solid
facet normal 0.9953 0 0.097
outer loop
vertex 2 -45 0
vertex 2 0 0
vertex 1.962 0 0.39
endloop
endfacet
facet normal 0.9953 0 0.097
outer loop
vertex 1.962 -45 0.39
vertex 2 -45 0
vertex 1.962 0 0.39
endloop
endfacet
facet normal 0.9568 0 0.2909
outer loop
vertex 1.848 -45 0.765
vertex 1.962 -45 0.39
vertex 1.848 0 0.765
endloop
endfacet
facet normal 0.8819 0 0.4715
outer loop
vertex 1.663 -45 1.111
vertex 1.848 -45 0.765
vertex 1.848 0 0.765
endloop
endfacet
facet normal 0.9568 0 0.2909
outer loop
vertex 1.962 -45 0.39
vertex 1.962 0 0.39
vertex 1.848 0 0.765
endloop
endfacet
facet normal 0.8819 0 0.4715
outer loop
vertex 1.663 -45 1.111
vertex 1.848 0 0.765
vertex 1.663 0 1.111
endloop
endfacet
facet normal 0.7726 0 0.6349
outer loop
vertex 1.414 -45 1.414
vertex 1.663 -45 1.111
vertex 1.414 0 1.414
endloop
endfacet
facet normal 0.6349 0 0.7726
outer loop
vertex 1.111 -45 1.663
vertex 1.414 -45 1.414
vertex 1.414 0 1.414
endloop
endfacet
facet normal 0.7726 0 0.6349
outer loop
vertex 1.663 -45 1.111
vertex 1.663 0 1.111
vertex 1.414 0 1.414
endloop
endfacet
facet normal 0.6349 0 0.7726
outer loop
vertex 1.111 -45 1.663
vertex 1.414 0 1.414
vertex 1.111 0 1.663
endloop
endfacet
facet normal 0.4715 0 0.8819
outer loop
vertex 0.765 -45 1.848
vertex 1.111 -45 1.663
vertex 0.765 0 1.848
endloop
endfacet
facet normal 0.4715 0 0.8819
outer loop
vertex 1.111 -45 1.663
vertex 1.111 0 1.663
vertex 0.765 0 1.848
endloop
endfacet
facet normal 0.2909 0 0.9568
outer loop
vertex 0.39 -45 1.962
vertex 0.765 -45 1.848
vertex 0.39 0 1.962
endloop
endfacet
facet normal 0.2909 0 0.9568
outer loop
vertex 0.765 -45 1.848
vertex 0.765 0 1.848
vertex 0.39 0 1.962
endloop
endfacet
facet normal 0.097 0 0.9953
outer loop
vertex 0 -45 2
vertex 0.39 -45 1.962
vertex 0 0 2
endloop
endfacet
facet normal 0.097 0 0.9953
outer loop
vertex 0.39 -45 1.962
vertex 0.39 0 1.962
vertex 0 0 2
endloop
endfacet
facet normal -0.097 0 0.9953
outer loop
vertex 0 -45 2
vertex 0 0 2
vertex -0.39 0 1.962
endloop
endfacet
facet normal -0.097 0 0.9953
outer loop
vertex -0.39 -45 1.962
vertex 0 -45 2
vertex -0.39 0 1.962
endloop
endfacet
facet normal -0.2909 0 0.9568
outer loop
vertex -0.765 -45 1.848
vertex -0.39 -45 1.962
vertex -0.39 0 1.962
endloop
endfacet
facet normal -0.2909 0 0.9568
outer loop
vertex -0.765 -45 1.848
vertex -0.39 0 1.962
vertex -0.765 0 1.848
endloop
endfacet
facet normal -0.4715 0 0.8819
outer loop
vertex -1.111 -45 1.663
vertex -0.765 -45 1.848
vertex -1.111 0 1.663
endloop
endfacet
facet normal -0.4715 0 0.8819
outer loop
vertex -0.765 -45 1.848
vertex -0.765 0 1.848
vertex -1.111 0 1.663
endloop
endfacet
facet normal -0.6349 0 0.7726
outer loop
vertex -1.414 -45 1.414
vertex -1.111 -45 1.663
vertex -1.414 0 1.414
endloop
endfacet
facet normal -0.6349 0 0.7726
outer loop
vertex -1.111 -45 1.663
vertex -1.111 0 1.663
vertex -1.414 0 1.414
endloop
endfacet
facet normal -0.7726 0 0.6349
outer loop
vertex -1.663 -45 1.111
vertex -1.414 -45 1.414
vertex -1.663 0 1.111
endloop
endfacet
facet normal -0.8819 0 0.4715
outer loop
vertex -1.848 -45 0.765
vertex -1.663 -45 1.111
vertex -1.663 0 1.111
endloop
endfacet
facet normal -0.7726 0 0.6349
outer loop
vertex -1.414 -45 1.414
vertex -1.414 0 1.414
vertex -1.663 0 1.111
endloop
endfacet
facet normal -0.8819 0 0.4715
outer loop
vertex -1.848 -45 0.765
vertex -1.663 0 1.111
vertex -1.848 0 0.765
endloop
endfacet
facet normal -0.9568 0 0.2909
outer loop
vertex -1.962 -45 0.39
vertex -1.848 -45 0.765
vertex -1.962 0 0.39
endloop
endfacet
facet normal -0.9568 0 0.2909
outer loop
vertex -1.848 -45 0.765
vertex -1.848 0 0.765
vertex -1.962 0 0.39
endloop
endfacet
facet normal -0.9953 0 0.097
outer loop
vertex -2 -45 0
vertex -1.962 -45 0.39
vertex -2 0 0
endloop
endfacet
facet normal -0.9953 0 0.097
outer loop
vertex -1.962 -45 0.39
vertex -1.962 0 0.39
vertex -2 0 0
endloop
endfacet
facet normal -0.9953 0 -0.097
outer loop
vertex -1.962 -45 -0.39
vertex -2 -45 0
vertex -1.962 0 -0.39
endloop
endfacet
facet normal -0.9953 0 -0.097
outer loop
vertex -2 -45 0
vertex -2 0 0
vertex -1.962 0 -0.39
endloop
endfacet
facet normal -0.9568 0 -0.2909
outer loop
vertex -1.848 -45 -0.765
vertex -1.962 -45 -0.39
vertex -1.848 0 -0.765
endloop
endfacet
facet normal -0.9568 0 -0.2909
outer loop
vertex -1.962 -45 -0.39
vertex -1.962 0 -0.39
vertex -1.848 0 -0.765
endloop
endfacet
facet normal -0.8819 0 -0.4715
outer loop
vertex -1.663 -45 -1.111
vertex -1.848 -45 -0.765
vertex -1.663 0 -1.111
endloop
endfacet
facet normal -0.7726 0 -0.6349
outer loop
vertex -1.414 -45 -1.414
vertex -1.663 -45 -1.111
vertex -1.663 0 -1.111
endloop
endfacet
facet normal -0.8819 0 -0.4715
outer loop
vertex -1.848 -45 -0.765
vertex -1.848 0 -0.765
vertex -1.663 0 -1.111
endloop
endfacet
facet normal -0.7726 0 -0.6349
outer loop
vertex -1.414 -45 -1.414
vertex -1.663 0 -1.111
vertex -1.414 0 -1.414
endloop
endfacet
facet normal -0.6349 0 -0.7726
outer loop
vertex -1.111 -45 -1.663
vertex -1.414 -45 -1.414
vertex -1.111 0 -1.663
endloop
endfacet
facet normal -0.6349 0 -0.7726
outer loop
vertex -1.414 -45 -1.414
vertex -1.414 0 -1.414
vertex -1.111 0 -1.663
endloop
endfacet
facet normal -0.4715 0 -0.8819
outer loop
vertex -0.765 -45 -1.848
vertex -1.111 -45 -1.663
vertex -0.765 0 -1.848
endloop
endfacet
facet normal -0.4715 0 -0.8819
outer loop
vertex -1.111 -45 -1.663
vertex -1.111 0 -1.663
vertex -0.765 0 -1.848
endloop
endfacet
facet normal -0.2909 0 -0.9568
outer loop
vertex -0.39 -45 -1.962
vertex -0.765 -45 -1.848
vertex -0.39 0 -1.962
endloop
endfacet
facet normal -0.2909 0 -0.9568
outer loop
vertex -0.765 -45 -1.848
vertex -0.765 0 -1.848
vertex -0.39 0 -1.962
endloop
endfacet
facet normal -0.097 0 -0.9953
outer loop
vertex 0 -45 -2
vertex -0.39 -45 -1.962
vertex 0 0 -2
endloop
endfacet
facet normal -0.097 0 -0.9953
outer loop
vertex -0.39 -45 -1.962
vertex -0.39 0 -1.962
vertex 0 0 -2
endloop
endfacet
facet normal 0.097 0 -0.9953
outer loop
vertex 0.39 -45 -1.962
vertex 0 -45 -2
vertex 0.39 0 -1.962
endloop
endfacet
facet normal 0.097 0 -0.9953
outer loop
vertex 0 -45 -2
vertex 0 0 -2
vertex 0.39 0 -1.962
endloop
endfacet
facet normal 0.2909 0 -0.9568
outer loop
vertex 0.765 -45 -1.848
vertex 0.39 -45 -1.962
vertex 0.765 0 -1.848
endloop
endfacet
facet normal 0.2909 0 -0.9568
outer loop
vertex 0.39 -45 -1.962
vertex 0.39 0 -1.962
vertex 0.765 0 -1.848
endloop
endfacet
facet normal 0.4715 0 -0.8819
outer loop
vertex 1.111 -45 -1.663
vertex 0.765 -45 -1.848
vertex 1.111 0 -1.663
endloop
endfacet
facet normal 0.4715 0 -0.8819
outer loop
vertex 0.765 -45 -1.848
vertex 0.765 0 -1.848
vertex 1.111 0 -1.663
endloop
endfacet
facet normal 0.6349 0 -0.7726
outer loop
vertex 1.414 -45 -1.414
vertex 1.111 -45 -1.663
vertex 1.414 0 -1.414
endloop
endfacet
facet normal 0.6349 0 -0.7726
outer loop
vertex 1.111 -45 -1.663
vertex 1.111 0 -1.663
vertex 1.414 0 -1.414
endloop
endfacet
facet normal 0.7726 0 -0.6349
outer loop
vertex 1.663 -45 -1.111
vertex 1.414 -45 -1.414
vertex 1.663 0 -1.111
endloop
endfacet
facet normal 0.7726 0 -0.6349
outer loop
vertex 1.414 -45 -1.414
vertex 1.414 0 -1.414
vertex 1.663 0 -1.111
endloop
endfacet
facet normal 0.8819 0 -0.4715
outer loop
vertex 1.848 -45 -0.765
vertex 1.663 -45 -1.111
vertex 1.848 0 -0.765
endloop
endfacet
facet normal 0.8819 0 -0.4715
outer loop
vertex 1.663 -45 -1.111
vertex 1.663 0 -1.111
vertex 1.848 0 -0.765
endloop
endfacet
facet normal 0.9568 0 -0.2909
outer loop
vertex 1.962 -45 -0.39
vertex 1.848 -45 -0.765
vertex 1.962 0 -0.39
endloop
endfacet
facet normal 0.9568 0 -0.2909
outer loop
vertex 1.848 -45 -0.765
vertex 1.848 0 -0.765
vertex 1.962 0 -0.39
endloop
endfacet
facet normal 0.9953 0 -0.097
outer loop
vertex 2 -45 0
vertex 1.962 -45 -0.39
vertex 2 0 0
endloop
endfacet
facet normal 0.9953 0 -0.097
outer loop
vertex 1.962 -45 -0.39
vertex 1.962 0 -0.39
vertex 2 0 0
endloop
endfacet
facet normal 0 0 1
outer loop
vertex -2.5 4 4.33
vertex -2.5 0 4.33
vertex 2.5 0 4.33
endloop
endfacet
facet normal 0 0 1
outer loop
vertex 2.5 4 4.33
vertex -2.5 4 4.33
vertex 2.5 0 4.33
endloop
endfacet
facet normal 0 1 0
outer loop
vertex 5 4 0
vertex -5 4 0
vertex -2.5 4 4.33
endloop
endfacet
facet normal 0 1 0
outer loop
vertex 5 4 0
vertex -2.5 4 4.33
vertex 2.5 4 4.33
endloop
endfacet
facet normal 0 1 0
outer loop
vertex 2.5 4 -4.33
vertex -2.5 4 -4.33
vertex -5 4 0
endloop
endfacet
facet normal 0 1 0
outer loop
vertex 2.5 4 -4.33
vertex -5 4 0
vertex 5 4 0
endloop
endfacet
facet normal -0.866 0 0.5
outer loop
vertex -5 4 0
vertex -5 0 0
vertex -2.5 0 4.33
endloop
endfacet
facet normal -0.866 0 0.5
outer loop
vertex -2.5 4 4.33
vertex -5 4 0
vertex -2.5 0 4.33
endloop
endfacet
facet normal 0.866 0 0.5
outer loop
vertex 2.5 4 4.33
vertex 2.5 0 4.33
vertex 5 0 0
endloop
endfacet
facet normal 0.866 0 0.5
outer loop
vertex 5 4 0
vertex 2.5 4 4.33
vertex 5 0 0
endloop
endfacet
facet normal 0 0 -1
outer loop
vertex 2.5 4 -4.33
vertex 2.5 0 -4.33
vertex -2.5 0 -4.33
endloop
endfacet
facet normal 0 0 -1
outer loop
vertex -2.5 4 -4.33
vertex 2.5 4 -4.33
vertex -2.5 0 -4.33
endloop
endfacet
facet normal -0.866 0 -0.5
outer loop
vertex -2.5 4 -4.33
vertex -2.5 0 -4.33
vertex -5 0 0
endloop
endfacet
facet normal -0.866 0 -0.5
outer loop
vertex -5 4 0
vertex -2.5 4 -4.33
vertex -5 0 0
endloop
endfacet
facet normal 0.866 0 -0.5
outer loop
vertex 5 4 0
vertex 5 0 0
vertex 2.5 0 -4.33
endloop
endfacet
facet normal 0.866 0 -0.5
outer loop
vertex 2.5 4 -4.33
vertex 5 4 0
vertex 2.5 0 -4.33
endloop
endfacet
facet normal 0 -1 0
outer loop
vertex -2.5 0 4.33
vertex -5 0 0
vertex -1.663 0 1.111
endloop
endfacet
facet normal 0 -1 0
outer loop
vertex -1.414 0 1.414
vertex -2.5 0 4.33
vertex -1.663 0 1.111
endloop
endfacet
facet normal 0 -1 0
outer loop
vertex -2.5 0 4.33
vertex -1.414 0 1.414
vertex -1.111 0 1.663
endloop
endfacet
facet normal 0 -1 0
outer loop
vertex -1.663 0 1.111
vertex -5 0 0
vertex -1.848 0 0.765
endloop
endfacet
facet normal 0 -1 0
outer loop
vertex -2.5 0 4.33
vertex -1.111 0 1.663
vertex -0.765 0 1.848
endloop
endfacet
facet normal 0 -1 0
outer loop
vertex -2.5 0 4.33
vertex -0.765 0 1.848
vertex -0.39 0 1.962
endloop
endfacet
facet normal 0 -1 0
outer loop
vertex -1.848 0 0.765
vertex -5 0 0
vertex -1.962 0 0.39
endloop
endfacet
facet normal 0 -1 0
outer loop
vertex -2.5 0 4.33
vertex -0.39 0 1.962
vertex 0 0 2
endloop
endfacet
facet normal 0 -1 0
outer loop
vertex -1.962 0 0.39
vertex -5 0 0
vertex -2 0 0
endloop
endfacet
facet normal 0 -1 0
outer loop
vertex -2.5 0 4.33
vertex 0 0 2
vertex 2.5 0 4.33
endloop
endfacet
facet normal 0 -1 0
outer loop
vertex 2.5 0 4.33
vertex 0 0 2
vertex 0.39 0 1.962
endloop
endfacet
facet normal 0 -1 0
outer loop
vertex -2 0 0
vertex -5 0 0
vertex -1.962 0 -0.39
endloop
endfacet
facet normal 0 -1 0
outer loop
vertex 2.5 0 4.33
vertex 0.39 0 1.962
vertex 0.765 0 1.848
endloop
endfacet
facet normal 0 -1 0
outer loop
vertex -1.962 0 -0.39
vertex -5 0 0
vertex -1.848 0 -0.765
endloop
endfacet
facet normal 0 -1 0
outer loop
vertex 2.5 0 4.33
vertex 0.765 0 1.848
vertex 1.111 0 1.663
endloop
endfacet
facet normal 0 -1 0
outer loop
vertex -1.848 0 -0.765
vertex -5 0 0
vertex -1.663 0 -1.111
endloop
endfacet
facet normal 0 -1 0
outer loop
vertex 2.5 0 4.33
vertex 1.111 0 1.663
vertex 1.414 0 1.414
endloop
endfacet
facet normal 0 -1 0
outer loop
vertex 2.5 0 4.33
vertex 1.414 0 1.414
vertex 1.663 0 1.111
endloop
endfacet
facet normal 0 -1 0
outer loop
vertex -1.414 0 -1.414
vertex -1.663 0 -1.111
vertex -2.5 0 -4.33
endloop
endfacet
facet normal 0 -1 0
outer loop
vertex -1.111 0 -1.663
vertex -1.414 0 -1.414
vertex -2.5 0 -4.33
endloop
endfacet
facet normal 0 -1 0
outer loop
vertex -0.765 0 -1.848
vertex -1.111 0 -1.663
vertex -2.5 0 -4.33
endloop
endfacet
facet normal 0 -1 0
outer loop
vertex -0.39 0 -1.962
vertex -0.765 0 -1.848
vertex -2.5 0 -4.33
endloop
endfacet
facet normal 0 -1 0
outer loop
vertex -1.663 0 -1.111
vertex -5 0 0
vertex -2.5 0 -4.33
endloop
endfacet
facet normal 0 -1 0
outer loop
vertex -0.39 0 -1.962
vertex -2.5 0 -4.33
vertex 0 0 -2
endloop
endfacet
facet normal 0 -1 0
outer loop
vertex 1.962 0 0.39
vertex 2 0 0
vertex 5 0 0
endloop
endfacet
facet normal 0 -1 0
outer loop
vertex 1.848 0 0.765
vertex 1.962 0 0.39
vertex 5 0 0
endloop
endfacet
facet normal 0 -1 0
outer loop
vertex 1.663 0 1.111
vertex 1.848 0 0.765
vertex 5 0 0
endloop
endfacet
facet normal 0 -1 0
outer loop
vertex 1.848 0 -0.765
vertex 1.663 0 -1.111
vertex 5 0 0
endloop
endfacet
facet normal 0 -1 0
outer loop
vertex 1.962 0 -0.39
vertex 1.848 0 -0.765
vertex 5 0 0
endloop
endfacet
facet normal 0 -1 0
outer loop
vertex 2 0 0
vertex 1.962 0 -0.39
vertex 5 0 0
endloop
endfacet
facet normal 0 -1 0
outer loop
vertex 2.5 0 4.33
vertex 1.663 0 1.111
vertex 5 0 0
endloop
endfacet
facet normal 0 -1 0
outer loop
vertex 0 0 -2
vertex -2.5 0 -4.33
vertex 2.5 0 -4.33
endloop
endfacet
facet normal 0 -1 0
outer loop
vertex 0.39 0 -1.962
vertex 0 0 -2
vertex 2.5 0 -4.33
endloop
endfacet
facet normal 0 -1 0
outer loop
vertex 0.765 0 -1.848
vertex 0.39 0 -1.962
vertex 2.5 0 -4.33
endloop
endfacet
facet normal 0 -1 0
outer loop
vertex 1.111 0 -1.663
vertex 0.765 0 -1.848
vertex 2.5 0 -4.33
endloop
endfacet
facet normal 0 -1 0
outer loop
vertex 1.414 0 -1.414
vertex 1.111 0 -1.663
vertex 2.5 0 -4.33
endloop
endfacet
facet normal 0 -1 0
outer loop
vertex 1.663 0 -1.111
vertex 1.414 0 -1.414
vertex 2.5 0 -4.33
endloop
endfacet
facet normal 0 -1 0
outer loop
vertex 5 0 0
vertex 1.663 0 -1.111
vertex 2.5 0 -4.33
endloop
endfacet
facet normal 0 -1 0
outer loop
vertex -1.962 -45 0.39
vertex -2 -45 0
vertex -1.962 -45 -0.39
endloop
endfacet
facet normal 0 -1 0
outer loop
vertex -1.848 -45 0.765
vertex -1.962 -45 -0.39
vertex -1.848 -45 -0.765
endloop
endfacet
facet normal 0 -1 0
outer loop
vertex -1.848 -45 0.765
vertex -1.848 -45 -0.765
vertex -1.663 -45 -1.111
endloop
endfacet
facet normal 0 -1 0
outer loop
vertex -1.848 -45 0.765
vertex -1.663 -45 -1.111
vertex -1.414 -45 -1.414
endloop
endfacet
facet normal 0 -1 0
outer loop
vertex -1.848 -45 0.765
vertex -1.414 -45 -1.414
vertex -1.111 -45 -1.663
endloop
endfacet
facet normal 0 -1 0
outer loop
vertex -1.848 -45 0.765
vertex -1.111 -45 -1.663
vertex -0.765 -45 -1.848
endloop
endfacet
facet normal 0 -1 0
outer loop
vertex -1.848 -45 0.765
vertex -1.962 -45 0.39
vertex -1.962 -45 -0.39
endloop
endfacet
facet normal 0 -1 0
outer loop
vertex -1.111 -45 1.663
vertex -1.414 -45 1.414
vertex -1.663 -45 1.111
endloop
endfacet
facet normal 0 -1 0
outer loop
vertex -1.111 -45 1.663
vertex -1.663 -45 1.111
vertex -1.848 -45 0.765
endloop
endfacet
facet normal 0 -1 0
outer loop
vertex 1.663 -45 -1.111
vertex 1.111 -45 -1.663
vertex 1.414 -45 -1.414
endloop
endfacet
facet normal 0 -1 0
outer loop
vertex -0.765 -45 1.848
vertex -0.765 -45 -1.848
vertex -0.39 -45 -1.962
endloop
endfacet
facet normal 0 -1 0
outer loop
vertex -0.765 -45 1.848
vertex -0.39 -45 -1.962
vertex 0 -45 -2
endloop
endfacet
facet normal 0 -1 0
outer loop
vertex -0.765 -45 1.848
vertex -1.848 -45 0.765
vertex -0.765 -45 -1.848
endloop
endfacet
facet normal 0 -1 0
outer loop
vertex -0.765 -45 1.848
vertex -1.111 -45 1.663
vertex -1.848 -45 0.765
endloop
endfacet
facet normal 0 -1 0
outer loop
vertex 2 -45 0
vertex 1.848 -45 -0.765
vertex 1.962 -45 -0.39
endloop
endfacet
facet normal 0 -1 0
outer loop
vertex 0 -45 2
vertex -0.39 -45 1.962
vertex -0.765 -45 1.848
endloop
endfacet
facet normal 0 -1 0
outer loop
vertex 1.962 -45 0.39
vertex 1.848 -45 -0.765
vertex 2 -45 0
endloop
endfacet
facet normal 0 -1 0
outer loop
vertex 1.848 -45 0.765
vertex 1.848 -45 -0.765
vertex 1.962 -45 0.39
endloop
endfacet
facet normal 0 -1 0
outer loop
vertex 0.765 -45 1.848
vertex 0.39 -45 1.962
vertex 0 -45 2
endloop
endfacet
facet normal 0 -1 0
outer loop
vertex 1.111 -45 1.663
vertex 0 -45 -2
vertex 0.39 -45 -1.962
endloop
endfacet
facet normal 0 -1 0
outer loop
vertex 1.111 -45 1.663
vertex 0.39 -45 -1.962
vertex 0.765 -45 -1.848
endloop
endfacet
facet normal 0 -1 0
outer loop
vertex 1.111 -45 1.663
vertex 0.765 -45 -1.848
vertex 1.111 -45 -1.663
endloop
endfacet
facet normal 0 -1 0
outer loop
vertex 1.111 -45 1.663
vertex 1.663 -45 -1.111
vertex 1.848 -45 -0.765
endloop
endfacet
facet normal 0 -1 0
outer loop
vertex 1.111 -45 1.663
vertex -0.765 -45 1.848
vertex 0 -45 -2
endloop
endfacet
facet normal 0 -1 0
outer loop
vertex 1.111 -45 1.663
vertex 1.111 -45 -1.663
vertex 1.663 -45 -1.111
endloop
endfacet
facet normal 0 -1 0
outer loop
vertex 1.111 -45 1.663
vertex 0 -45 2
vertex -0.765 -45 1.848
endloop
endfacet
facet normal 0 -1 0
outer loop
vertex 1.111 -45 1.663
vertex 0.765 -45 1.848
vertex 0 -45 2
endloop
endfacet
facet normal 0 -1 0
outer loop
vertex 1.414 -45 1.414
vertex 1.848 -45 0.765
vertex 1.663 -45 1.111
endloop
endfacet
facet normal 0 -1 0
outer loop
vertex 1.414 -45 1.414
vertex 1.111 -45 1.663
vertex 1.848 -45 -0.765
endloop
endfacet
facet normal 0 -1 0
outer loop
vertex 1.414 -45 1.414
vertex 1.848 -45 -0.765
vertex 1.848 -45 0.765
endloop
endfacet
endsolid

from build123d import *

# Parameters (mm, degrees)
SALIENTE_EXTRUIR1_DEPTH = 4
CROQUIS2_R              = 2
SALIENTE_EXTRUIR2_DEPTH = 45


with BuildPart() as part:
    # Croquis1 → Saliente-Extruir1 (new body)
    with BuildSketch(Plane(origin=(0, 0, 0), x_dir=(1, 0, 0), z_dir=(0, 1, 0))):
        Polygon((5, 0), (2.5, 4.330127019), (-2.5, 4.330127019), (-5, 0), (-2.5, -4.330127019), (2.5, -4.330127019), align=None)
    extrude(amount=SALIENTE_EXTRUIR1_DEPTH)

    # Croquis2 → Saliente-Extruir2 (add)
    with BuildSketch(Plane.XZ):
        Circle(CROQUIS2_R)
    extrude(amount=SALIENTE_EXTRUIR2_DEPTH)


solid = part.part
